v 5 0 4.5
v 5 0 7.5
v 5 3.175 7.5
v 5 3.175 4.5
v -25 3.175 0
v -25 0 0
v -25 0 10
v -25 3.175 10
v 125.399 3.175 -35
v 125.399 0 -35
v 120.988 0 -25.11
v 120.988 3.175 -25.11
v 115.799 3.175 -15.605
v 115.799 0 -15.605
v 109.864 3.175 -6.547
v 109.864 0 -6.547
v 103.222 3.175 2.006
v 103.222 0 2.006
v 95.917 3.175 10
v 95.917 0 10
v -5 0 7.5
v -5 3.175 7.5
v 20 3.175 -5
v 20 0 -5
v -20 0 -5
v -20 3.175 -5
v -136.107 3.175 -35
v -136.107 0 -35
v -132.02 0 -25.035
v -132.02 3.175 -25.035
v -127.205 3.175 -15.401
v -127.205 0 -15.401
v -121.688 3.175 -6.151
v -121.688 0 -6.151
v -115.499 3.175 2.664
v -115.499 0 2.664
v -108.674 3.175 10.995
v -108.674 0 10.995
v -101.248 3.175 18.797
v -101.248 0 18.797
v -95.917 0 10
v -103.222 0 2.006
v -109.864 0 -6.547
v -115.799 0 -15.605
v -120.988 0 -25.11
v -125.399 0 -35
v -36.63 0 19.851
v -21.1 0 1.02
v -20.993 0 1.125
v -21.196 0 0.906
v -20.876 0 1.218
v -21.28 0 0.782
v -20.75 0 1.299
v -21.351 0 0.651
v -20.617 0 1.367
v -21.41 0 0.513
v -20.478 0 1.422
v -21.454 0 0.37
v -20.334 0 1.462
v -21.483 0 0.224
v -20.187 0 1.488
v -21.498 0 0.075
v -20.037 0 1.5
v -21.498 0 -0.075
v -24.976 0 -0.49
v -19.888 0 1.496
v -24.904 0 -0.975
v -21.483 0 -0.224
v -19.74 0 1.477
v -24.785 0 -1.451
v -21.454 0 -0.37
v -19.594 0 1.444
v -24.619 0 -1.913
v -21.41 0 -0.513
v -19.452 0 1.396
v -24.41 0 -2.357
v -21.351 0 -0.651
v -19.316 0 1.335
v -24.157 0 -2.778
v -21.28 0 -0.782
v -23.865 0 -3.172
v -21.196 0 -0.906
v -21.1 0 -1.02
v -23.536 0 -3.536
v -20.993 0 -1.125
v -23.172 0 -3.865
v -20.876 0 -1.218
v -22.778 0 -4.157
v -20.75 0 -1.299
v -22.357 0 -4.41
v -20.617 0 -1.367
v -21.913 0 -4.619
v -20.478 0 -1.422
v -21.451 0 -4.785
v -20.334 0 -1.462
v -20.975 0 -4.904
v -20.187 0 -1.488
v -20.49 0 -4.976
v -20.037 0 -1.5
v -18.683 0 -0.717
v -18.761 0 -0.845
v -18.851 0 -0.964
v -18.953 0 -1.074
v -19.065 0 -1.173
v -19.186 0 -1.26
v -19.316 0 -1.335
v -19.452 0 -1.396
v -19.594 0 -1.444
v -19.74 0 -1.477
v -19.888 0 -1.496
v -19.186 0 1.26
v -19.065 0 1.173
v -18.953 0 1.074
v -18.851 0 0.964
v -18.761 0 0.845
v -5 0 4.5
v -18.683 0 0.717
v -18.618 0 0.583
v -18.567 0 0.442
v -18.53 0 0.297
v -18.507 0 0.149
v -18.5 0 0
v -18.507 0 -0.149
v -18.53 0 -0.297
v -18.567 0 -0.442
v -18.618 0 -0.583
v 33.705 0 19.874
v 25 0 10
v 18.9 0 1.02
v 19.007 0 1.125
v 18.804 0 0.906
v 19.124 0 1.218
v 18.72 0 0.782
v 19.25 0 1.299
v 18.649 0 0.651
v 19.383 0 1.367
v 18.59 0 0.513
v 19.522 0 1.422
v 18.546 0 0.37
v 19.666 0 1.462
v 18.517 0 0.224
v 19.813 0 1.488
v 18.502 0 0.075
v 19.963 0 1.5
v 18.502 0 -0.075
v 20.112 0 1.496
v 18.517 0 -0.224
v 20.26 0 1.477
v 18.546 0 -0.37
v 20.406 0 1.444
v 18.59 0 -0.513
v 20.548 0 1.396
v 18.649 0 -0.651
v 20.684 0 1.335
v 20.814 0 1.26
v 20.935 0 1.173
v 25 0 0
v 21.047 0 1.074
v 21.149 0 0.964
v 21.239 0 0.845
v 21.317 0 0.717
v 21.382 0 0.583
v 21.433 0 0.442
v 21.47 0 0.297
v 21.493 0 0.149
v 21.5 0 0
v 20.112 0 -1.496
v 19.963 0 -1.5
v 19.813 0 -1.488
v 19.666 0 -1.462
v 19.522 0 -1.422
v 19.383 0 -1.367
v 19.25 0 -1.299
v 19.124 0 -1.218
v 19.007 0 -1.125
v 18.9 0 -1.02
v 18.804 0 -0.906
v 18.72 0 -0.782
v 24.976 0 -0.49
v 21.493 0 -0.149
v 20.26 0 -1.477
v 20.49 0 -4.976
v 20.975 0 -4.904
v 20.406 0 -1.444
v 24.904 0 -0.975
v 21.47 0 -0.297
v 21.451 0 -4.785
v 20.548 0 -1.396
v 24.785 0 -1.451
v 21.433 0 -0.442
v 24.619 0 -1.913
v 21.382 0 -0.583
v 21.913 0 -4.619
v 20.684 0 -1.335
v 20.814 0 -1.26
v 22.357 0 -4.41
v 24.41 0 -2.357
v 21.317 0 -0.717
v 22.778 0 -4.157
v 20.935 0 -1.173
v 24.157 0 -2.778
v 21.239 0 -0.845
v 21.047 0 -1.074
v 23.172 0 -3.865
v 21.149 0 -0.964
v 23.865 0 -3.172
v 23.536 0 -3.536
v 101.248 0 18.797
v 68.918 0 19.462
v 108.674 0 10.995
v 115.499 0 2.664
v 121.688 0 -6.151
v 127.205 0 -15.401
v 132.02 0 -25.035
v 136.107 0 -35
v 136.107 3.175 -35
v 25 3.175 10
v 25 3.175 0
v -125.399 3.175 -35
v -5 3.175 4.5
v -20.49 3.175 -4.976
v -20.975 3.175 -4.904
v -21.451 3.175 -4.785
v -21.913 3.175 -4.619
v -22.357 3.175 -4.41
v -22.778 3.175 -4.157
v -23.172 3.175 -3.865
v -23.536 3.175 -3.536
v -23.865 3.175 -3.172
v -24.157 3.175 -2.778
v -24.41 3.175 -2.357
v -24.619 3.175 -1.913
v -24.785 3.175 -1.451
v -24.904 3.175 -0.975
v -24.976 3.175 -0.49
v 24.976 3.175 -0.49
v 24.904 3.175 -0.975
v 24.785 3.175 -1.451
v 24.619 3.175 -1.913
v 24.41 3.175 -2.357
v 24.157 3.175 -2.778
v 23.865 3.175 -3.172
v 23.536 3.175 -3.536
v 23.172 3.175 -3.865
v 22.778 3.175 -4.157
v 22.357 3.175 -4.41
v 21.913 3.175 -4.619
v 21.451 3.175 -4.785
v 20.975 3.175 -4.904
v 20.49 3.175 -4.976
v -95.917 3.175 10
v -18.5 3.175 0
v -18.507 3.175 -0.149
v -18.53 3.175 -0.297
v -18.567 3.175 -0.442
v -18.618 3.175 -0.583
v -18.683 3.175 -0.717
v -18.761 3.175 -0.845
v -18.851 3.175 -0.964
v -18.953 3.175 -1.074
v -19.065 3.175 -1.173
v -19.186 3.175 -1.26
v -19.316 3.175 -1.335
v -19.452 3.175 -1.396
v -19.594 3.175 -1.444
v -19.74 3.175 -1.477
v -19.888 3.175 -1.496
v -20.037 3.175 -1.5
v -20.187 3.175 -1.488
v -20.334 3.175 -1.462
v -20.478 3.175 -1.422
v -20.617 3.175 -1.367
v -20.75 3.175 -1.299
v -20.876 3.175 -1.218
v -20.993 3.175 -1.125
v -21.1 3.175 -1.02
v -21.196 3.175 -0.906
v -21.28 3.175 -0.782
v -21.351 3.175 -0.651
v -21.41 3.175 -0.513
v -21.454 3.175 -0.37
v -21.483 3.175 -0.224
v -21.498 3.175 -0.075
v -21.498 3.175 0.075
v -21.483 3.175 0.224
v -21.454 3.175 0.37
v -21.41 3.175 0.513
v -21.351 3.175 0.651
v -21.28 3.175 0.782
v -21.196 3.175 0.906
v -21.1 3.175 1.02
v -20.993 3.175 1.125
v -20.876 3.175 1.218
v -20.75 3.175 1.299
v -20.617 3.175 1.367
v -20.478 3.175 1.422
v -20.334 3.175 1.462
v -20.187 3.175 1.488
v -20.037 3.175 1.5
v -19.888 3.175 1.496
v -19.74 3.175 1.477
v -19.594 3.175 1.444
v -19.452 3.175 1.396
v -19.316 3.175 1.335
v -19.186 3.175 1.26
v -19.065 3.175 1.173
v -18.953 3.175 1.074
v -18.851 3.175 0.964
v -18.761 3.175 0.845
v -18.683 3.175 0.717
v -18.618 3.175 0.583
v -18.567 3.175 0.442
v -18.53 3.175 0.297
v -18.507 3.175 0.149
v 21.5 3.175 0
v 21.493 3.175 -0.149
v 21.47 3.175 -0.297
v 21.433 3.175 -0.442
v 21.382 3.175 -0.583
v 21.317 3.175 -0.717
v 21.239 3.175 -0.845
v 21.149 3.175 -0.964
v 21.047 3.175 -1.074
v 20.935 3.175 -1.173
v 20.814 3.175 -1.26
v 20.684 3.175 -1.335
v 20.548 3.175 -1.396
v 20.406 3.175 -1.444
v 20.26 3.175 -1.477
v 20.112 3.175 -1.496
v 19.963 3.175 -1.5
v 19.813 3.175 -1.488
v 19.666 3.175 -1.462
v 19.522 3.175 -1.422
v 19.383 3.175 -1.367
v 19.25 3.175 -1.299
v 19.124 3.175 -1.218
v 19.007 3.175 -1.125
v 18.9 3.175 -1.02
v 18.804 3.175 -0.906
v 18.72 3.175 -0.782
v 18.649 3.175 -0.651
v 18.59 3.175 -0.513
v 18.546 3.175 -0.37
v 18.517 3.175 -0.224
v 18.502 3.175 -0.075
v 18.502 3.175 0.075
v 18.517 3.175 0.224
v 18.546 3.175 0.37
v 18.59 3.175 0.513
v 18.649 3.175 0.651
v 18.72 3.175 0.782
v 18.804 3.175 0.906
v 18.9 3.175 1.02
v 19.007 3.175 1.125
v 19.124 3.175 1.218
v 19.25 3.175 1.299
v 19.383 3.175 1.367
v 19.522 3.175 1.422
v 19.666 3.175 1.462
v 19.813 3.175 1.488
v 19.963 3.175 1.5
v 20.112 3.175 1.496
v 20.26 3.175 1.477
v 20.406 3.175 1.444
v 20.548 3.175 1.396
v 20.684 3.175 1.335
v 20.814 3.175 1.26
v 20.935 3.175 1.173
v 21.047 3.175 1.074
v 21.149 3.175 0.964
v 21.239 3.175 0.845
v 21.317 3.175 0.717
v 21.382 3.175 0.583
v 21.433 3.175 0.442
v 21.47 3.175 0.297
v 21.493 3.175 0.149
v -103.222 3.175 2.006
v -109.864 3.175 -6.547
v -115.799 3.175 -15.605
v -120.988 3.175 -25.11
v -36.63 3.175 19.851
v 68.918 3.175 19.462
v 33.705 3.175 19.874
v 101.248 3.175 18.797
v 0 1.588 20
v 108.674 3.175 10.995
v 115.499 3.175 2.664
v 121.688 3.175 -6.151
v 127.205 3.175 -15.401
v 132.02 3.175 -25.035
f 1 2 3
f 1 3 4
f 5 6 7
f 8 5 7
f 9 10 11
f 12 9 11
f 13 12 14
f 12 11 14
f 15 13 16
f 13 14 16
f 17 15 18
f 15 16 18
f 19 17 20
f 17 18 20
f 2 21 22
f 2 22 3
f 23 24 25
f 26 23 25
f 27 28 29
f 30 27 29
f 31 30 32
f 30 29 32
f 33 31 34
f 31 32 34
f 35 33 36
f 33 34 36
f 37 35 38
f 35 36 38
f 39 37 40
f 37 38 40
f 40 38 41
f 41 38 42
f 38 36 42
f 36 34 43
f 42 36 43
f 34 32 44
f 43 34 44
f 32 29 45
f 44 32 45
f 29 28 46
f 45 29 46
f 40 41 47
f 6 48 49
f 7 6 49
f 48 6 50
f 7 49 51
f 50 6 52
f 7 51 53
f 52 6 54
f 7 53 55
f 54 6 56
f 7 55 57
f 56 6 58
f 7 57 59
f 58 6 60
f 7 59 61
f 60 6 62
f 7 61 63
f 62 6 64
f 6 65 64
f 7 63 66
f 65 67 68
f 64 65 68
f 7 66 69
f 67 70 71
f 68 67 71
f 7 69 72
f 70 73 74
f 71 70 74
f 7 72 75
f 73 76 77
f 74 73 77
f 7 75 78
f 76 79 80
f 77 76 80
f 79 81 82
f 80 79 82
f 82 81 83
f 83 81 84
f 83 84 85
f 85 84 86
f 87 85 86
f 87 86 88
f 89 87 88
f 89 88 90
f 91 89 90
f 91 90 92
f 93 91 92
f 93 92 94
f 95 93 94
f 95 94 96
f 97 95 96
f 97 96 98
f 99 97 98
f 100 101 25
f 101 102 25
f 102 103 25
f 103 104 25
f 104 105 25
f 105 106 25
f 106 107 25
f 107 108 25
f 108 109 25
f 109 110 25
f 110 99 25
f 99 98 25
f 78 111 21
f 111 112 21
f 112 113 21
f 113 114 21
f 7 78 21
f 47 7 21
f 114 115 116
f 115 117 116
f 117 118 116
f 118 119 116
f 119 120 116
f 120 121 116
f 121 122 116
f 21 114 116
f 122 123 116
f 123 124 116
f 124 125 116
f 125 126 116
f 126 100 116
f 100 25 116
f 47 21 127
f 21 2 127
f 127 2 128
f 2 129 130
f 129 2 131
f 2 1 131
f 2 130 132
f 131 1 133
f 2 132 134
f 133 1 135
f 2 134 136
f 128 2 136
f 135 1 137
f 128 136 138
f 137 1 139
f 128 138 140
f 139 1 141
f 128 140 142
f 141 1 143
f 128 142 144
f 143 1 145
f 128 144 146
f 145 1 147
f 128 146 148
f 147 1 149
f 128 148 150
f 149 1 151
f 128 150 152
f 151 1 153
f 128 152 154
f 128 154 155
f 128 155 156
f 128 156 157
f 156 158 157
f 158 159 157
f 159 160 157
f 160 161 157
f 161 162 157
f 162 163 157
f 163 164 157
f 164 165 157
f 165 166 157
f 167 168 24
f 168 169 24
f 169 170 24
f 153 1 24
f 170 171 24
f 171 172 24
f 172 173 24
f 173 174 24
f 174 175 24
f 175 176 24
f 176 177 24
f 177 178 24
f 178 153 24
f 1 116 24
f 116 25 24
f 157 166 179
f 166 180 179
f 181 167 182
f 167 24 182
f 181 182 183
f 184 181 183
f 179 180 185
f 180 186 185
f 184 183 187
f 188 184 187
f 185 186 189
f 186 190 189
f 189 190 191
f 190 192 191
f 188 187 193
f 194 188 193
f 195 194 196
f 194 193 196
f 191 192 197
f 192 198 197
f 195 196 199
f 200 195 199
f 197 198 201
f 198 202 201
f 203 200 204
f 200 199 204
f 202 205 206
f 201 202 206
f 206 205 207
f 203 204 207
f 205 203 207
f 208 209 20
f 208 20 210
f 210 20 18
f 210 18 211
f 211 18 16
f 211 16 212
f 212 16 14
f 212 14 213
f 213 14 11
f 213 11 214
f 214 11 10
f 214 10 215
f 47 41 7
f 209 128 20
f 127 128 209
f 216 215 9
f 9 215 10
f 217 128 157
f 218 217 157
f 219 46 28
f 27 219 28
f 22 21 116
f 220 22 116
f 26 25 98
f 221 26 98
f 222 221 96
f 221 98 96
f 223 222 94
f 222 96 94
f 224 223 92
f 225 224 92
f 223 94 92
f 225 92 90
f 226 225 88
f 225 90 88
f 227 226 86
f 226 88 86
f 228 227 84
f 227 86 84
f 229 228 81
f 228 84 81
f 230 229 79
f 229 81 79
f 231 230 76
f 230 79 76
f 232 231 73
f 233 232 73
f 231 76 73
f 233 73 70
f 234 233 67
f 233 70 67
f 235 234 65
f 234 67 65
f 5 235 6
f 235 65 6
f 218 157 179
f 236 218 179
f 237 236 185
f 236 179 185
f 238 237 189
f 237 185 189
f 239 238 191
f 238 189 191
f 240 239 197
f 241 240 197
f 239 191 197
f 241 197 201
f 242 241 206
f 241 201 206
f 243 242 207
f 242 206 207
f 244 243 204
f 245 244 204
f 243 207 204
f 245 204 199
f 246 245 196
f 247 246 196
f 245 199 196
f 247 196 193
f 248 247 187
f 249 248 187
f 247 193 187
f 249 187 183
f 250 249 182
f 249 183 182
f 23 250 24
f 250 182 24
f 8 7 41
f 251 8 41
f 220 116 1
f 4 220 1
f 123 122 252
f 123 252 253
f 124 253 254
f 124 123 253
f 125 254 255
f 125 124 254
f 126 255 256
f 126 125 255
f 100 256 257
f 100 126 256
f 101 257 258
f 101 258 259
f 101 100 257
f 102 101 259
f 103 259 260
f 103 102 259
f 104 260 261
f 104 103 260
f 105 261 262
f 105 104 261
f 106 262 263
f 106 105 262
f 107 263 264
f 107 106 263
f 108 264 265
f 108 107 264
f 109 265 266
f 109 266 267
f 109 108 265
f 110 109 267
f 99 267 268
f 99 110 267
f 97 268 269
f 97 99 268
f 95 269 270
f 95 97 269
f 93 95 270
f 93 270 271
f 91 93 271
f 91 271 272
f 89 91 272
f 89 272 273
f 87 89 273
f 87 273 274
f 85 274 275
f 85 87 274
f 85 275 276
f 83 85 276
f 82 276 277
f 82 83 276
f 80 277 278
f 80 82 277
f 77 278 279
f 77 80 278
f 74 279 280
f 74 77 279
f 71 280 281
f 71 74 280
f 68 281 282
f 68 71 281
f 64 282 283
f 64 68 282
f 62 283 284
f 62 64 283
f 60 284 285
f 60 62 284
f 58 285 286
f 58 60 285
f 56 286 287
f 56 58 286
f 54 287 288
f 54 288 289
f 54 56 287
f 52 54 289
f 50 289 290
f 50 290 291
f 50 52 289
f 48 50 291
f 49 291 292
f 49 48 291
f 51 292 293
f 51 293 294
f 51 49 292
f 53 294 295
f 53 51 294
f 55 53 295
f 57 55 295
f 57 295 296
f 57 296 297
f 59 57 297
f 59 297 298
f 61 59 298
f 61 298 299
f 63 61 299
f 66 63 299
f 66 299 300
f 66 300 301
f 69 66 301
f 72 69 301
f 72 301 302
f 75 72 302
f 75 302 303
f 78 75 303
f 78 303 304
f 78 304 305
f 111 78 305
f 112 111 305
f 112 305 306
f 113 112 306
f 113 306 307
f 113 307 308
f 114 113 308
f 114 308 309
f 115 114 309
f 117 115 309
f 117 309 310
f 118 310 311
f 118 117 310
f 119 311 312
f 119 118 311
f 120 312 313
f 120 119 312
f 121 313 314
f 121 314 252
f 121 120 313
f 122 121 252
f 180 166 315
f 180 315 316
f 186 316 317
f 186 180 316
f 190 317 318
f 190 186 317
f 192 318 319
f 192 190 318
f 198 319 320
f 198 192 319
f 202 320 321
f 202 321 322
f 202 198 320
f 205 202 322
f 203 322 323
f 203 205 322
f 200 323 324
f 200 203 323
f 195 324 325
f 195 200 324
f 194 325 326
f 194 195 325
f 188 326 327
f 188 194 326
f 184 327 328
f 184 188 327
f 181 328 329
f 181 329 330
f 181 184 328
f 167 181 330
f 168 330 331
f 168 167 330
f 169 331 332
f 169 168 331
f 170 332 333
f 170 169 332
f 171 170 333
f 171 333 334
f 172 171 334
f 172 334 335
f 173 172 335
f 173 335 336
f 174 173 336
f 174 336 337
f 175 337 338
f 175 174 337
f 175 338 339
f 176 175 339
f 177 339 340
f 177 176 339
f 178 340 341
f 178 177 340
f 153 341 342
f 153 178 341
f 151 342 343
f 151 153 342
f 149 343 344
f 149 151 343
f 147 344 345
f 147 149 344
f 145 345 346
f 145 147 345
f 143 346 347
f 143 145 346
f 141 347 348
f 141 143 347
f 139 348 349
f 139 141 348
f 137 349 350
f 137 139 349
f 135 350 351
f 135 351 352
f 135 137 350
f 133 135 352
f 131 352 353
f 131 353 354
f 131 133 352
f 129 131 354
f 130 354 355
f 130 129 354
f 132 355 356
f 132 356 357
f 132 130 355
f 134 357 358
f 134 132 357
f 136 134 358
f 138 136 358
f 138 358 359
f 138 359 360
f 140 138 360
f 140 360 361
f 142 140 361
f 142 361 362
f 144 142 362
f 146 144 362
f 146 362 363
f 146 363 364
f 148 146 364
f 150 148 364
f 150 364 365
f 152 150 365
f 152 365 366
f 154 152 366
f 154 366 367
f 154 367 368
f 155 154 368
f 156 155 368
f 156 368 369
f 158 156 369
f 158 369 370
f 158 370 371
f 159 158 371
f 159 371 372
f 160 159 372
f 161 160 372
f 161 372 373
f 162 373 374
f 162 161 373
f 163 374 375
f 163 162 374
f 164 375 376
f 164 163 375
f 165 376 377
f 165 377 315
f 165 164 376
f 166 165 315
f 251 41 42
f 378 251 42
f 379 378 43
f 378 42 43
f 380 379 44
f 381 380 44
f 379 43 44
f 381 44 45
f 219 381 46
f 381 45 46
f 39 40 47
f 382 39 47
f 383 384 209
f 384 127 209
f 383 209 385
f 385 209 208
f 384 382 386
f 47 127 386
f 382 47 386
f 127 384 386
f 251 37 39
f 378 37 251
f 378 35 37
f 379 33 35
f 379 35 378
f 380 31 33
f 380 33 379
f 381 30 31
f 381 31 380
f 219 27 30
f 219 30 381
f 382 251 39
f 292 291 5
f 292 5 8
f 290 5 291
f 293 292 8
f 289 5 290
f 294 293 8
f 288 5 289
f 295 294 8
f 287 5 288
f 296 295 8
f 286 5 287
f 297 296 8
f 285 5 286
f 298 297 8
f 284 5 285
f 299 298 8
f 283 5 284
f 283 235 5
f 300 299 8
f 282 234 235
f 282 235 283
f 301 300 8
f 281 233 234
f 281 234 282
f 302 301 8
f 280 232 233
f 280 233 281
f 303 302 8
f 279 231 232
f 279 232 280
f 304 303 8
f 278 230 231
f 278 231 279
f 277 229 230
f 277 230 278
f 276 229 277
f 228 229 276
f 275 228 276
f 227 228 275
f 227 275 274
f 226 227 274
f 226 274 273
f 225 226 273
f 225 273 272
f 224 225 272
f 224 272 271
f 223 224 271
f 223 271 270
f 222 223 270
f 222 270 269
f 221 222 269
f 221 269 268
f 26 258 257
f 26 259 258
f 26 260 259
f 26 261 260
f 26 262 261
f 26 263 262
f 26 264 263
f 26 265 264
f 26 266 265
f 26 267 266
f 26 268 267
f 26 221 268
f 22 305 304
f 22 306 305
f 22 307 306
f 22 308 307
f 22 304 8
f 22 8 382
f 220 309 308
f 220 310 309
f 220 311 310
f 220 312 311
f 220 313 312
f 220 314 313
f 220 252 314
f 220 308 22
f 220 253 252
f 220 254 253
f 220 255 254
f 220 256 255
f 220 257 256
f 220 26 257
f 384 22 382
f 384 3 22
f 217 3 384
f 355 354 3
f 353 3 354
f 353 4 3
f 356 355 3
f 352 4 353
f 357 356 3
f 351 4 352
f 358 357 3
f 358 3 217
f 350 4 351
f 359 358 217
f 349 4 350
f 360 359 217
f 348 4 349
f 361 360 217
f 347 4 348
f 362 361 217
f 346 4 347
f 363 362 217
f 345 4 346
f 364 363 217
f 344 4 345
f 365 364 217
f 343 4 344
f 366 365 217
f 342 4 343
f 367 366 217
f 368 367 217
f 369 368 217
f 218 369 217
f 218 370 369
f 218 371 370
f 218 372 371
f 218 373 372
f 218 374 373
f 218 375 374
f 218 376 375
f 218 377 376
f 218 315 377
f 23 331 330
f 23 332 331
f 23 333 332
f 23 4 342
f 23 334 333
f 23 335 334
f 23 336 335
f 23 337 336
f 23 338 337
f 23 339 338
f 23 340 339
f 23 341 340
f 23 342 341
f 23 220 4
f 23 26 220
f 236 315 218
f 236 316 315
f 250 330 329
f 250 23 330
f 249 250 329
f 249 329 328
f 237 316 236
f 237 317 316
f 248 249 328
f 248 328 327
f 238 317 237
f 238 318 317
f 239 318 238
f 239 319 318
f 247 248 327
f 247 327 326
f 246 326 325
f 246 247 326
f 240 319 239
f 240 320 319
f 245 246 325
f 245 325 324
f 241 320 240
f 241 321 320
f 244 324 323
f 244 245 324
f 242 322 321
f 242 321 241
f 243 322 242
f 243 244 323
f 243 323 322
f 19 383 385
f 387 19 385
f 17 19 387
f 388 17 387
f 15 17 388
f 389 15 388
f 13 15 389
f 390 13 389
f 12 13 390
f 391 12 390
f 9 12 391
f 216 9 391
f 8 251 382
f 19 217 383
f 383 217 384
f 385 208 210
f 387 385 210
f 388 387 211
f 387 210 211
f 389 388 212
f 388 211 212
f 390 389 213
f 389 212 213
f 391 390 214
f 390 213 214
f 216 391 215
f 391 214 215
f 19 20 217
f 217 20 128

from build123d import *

# Parameters (mm, degrees)
SKETCH_1_R      = 1.5
SKETCH_1_W      = 10
SKETCH_1_H      = 3
EXTRUDE_1_DEPTH = 3.175


with BuildPart() as part:
    # 草图1 → 凸台-拉伸1 (new body)
    with BuildSketch(Plane(origin=(0, 0, 0), x_dir=(1, 0, 0), z_dir=(0, 1, 0))):
        with BuildLine():
            Line((-25, -10), (-95.916630466, -10))
            ThreePointArc((-95.916630466, -10), (-112.922283606, 11.016502751), (-125.39936204, 35))
            Line((-125.39936204, 35), (-136.106575888, 35))
            ThreePointArc((-136.106575888, 35), (-121.687593109, 6.15122269), (-101.248422592, -18.796709594))
            add(Edge.make_bspline(
                [(-101.248422592, -18.796709594), (0, -21.367886927), (101.248422592, -18.796709594)],
                knots=[1.075169889, 1.075169889, 1.075169889, 2.066422765, 2.066422765, 2.066422765], degree=2, weights=[1, 0.879670959, 1]))
            ThreePointArc((101.248422592, -18.796709594), (121.687593109, 6.15122269), (136.106575888, 35))
            Line((136.106575888, 35), (125.39936204, 35))
            ThreePointArc((125.39936204, 35), (112.922283606, 11.016502751), (95.916630466, -10))
            Line((95.916630466, -10), (25, -10))
            Line((25, -10), (25, 0))
            ThreePointArc((25, 0), (23.535533906, 3.535533906), (20, 5))
            Line((20, 5), (-20, 5))
            ThreePointArc((-20, 5), (-23.535533906, 3.535533906), (-25, 0))
            Line((-25, 0), (-25, -10))
        make_face()
        with Locations((-20, 0)):
            Circle(SKETCH_1_R, mode=Mode.SUBTRACT)
        with Locations((20, 0)):
            Circle(SKETCH_1_R, mode=Mode.SUBTRACT)
        with Locations((0, -6)):
            Rectangle(SKETCH_1_W, SKETCH_1_H, mode=Mode.SUBTRACT)
    extrude(amount=EXTRUDE_1_DEPTH)


solid = part.part
